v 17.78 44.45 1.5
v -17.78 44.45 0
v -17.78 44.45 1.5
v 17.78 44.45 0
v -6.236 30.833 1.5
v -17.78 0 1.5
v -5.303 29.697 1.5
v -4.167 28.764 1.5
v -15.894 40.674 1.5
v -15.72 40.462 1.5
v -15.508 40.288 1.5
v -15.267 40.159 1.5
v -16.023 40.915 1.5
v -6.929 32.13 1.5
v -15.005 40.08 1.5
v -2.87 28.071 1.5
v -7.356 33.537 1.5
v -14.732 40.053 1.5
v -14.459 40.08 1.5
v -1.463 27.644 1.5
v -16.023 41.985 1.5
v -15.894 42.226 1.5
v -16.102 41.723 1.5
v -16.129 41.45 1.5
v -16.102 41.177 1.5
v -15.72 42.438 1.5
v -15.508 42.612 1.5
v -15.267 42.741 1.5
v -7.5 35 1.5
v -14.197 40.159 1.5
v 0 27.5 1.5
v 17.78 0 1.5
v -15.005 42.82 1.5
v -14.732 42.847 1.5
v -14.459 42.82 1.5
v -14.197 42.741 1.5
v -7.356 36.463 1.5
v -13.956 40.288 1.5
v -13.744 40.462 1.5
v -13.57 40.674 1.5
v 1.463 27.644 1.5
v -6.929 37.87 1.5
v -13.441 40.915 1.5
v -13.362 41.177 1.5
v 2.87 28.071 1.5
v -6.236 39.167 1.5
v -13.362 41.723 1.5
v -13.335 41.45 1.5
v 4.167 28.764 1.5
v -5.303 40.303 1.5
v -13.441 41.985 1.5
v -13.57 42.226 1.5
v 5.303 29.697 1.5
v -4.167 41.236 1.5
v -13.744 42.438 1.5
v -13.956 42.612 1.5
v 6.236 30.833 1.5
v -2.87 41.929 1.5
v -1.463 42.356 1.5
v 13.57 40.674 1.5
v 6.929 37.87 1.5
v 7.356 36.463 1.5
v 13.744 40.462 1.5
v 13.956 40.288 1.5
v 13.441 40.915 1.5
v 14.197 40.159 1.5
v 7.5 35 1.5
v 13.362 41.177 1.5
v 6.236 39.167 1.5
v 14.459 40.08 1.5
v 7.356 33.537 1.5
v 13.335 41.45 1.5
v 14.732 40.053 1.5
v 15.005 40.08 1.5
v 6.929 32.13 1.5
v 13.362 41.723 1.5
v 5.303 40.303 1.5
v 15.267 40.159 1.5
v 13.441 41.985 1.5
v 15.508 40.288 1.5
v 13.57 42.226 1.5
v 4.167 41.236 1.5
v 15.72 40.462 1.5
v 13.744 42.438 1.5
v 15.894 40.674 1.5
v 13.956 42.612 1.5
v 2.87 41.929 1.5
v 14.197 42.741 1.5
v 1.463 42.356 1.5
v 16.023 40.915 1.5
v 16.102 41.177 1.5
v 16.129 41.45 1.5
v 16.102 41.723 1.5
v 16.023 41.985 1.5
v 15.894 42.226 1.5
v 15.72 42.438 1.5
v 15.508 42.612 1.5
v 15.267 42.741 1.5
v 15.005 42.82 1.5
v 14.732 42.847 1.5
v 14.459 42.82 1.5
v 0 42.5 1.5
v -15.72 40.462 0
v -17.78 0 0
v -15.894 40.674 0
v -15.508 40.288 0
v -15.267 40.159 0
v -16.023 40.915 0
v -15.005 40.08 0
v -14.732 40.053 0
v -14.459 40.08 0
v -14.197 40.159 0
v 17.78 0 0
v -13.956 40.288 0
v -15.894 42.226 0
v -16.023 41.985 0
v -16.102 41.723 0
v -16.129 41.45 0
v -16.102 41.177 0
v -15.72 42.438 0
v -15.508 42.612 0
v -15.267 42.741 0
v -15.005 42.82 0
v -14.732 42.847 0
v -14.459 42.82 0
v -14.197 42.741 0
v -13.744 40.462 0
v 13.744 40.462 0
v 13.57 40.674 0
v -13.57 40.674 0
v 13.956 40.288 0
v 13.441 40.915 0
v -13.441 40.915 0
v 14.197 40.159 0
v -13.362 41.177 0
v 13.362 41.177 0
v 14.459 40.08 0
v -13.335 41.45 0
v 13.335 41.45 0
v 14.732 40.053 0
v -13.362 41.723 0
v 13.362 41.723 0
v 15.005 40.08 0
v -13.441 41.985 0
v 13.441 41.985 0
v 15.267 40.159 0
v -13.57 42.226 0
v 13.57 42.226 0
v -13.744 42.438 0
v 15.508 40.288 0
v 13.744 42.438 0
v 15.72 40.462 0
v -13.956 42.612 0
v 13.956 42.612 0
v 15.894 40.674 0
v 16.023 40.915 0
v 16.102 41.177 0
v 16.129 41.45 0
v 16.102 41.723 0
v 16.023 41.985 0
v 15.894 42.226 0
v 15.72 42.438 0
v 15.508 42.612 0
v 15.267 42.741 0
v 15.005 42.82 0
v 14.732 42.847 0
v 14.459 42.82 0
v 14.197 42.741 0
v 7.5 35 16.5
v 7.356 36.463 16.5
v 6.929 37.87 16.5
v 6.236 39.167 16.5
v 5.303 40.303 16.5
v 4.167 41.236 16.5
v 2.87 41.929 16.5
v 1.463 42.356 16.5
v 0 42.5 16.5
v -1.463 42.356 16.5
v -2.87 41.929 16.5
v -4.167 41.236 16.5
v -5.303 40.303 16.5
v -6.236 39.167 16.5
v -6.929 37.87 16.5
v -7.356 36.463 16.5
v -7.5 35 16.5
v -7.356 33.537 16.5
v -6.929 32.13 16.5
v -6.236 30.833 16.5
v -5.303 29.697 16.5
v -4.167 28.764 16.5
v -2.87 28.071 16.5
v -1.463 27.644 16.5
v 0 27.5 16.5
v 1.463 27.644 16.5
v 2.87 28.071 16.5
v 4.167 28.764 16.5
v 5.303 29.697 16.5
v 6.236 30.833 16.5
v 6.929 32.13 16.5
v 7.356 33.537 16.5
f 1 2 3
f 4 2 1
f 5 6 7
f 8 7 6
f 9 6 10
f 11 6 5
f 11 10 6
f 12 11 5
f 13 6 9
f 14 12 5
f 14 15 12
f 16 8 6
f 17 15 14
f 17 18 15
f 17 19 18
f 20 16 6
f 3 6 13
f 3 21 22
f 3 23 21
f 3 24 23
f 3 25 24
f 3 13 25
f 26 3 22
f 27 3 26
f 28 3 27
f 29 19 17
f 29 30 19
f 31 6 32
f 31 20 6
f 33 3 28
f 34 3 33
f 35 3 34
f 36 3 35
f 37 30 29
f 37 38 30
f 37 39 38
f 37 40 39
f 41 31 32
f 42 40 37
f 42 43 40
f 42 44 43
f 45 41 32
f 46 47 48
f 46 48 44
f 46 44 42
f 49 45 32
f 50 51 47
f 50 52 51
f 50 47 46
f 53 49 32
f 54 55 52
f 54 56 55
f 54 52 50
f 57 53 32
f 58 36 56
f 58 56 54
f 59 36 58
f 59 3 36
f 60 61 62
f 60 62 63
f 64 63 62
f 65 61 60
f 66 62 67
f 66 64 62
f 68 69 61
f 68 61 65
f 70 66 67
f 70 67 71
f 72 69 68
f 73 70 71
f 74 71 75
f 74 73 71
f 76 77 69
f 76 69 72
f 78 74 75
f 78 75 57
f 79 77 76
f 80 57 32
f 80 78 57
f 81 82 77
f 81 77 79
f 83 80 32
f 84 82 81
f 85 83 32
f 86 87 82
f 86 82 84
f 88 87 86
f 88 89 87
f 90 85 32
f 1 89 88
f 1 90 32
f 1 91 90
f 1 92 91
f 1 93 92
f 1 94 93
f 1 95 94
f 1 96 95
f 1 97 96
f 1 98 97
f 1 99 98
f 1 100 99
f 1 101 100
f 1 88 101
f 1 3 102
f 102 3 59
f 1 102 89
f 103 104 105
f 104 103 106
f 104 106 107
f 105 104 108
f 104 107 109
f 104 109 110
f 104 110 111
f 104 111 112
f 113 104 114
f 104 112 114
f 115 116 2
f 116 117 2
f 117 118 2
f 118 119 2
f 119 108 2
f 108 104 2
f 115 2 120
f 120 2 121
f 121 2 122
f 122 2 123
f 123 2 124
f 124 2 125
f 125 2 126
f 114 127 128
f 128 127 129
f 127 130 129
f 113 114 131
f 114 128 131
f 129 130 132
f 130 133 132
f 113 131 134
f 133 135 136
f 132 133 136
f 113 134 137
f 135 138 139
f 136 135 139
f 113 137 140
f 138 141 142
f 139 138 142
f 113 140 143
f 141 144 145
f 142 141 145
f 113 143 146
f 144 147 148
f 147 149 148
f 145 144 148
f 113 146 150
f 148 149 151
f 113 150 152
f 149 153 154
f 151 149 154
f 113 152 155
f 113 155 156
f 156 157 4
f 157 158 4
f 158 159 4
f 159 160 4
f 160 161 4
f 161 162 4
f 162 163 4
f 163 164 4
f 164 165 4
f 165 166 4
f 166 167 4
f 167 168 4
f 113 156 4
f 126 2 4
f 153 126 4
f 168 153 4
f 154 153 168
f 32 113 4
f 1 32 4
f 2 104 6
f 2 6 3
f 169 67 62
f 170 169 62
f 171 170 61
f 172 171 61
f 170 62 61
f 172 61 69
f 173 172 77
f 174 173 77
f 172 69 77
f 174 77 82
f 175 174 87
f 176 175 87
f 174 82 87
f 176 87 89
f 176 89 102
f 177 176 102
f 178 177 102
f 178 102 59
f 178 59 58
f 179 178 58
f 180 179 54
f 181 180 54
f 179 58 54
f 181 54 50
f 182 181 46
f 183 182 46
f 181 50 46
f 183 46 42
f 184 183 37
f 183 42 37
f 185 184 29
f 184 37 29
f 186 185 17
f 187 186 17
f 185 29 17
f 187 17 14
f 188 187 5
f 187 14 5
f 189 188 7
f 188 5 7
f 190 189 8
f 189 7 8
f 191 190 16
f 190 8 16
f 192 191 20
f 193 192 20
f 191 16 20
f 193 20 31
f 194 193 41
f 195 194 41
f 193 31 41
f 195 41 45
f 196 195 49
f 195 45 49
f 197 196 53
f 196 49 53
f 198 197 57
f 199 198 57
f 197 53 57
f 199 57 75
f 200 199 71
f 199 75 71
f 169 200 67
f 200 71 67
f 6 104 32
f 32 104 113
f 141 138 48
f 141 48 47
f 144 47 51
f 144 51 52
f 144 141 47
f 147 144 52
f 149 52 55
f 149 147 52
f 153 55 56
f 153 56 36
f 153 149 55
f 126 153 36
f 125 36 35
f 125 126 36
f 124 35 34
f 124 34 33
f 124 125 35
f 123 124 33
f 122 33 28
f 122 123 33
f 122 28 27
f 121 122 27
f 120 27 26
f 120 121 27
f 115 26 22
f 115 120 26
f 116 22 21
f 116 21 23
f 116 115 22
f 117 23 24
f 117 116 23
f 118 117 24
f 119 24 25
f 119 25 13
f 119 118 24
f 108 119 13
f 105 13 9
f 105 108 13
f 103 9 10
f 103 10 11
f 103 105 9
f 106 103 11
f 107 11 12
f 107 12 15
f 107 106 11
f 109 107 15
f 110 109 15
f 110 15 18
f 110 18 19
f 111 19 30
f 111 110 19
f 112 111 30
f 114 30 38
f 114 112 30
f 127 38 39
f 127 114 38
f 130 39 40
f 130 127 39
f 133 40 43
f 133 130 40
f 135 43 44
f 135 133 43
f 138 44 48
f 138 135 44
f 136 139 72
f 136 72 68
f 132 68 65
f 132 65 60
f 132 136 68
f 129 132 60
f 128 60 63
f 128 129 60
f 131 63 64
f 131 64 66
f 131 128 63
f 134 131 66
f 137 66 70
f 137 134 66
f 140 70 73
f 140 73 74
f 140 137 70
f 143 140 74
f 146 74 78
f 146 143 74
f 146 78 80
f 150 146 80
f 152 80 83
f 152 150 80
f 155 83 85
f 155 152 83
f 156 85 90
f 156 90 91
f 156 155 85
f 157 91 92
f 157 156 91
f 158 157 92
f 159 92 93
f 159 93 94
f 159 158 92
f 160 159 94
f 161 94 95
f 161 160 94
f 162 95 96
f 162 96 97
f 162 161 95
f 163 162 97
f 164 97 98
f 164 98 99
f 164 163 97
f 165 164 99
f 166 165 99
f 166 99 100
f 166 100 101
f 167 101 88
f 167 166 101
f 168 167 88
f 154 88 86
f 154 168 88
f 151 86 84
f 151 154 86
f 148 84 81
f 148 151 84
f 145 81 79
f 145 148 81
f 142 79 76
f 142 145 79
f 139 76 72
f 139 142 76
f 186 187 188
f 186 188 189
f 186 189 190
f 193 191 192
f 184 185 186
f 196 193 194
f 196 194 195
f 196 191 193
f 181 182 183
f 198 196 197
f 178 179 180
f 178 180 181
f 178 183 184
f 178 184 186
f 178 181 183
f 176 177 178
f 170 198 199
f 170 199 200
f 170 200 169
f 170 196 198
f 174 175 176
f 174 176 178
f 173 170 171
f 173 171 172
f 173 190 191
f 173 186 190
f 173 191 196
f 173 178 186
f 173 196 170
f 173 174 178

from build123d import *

# Parameters (mm, degrees)
SKETCH_1_W      = 35.56
SKETCH_1_H      = 44.45
SKETCH_1_R      = 1.397
EXTRUDE_1_DEPTH = 1.5
SKETCH_2_R      = 7.5
EXTRUDE_2_DEPTH = 15


with BuildPart() as part:
    # 草图1 → 凸台-拉伸1 (new body)
    with BuildSketch(Plane.XY):
        with Locations((0, 22.225)):
            Rectangle(SKETCH_1_W, SKETCH_1_H)
        with Locations((-14.732, 41.45)):
            Circle(SKETCH_1_R, mode=Mode.SUBTRACT)
        with Locations(Location((14.732, 41.45, 0), (0, 0, 180))):
            Circle(SKETCH_1_R, mode=Mode.SUBTRACT)
    extrude(amount=EXTRUDE_1_DEPTH)

    # 草图2 → 凸台-拉伸2 (add)
    with BuildSketch(Plane.XY.offset(1.5)):
        with Locations((0, 35)):
            Circle(SKETCH_2_R)
    extrude(amount=EXTRUDE_2_DEPTH)


solid = part.part
